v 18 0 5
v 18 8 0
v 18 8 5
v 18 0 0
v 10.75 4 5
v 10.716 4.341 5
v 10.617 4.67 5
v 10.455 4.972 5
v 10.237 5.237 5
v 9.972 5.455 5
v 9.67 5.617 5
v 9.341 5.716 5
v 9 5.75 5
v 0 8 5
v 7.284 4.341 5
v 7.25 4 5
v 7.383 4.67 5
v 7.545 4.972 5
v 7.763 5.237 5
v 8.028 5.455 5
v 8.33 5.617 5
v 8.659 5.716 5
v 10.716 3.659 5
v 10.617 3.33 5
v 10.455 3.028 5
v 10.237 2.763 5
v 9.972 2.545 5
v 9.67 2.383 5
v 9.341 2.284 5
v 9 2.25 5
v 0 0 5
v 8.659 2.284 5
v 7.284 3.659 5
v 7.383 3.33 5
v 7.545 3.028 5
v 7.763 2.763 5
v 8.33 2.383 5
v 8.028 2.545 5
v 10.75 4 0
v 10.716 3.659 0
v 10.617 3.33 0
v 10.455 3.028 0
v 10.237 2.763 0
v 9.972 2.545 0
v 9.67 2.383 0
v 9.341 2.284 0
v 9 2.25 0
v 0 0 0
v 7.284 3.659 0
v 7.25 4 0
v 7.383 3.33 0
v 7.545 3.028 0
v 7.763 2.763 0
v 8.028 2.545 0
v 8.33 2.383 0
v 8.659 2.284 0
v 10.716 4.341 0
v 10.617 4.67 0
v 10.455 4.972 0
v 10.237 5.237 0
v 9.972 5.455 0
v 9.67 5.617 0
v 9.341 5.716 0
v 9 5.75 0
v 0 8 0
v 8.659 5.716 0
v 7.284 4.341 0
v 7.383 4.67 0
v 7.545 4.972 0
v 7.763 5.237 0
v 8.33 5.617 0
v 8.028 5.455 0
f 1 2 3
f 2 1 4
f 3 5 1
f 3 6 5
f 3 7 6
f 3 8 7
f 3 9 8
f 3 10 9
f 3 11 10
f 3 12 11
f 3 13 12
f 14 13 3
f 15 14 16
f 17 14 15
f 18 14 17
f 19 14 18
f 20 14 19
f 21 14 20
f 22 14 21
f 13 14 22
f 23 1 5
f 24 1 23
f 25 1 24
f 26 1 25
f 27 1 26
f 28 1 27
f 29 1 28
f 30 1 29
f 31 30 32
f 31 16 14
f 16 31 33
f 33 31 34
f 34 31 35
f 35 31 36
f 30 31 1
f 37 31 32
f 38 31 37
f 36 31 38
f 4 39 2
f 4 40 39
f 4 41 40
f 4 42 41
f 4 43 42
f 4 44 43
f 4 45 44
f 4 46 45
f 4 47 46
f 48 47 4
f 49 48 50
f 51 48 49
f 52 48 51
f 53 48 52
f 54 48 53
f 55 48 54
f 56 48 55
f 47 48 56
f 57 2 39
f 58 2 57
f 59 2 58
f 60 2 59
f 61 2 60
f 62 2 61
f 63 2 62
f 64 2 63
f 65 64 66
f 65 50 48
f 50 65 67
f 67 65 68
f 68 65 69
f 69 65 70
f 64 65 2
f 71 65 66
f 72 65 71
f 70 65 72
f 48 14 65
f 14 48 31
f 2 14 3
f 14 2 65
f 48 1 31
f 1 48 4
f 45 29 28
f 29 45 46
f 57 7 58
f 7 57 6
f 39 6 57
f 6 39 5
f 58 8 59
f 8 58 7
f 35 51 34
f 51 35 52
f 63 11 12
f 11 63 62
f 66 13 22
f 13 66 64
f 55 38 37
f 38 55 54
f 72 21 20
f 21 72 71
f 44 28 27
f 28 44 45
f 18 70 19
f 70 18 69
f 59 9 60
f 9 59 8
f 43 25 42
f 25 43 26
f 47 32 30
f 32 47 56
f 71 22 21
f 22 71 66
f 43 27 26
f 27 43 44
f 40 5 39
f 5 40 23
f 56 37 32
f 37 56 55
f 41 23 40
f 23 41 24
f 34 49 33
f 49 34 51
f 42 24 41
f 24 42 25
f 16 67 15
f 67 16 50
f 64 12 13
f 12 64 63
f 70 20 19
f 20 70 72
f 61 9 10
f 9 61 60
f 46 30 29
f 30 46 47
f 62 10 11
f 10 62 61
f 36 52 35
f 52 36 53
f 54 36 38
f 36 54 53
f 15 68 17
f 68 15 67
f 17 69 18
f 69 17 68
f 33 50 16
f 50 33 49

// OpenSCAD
$fn = 32;

// ----------------------------------------------------------------------
// Micro pad: drilled pad, 5-20 mm class
// ----------------------------------------------------------------------

// --- parameters (mm) ---
pad_l = 18;               // pad length, X
pad_w = 8;                // pad width, Y
pad_t = 5;                // pad thickness, Z
hole_d = 3.5;             // through hole diameter
fit_tol = 0.05;           // tolerance for press fits, mm
free_tol = 0.3;           // tolerance for clearance fits, mm

difference() {
  cube([pad_l, pad_w, pad_t]);
  translate([pad_l / 2, pad_w / 2, -1])
    cylinder(h = pad_t + 2, d = hole_d);
}
